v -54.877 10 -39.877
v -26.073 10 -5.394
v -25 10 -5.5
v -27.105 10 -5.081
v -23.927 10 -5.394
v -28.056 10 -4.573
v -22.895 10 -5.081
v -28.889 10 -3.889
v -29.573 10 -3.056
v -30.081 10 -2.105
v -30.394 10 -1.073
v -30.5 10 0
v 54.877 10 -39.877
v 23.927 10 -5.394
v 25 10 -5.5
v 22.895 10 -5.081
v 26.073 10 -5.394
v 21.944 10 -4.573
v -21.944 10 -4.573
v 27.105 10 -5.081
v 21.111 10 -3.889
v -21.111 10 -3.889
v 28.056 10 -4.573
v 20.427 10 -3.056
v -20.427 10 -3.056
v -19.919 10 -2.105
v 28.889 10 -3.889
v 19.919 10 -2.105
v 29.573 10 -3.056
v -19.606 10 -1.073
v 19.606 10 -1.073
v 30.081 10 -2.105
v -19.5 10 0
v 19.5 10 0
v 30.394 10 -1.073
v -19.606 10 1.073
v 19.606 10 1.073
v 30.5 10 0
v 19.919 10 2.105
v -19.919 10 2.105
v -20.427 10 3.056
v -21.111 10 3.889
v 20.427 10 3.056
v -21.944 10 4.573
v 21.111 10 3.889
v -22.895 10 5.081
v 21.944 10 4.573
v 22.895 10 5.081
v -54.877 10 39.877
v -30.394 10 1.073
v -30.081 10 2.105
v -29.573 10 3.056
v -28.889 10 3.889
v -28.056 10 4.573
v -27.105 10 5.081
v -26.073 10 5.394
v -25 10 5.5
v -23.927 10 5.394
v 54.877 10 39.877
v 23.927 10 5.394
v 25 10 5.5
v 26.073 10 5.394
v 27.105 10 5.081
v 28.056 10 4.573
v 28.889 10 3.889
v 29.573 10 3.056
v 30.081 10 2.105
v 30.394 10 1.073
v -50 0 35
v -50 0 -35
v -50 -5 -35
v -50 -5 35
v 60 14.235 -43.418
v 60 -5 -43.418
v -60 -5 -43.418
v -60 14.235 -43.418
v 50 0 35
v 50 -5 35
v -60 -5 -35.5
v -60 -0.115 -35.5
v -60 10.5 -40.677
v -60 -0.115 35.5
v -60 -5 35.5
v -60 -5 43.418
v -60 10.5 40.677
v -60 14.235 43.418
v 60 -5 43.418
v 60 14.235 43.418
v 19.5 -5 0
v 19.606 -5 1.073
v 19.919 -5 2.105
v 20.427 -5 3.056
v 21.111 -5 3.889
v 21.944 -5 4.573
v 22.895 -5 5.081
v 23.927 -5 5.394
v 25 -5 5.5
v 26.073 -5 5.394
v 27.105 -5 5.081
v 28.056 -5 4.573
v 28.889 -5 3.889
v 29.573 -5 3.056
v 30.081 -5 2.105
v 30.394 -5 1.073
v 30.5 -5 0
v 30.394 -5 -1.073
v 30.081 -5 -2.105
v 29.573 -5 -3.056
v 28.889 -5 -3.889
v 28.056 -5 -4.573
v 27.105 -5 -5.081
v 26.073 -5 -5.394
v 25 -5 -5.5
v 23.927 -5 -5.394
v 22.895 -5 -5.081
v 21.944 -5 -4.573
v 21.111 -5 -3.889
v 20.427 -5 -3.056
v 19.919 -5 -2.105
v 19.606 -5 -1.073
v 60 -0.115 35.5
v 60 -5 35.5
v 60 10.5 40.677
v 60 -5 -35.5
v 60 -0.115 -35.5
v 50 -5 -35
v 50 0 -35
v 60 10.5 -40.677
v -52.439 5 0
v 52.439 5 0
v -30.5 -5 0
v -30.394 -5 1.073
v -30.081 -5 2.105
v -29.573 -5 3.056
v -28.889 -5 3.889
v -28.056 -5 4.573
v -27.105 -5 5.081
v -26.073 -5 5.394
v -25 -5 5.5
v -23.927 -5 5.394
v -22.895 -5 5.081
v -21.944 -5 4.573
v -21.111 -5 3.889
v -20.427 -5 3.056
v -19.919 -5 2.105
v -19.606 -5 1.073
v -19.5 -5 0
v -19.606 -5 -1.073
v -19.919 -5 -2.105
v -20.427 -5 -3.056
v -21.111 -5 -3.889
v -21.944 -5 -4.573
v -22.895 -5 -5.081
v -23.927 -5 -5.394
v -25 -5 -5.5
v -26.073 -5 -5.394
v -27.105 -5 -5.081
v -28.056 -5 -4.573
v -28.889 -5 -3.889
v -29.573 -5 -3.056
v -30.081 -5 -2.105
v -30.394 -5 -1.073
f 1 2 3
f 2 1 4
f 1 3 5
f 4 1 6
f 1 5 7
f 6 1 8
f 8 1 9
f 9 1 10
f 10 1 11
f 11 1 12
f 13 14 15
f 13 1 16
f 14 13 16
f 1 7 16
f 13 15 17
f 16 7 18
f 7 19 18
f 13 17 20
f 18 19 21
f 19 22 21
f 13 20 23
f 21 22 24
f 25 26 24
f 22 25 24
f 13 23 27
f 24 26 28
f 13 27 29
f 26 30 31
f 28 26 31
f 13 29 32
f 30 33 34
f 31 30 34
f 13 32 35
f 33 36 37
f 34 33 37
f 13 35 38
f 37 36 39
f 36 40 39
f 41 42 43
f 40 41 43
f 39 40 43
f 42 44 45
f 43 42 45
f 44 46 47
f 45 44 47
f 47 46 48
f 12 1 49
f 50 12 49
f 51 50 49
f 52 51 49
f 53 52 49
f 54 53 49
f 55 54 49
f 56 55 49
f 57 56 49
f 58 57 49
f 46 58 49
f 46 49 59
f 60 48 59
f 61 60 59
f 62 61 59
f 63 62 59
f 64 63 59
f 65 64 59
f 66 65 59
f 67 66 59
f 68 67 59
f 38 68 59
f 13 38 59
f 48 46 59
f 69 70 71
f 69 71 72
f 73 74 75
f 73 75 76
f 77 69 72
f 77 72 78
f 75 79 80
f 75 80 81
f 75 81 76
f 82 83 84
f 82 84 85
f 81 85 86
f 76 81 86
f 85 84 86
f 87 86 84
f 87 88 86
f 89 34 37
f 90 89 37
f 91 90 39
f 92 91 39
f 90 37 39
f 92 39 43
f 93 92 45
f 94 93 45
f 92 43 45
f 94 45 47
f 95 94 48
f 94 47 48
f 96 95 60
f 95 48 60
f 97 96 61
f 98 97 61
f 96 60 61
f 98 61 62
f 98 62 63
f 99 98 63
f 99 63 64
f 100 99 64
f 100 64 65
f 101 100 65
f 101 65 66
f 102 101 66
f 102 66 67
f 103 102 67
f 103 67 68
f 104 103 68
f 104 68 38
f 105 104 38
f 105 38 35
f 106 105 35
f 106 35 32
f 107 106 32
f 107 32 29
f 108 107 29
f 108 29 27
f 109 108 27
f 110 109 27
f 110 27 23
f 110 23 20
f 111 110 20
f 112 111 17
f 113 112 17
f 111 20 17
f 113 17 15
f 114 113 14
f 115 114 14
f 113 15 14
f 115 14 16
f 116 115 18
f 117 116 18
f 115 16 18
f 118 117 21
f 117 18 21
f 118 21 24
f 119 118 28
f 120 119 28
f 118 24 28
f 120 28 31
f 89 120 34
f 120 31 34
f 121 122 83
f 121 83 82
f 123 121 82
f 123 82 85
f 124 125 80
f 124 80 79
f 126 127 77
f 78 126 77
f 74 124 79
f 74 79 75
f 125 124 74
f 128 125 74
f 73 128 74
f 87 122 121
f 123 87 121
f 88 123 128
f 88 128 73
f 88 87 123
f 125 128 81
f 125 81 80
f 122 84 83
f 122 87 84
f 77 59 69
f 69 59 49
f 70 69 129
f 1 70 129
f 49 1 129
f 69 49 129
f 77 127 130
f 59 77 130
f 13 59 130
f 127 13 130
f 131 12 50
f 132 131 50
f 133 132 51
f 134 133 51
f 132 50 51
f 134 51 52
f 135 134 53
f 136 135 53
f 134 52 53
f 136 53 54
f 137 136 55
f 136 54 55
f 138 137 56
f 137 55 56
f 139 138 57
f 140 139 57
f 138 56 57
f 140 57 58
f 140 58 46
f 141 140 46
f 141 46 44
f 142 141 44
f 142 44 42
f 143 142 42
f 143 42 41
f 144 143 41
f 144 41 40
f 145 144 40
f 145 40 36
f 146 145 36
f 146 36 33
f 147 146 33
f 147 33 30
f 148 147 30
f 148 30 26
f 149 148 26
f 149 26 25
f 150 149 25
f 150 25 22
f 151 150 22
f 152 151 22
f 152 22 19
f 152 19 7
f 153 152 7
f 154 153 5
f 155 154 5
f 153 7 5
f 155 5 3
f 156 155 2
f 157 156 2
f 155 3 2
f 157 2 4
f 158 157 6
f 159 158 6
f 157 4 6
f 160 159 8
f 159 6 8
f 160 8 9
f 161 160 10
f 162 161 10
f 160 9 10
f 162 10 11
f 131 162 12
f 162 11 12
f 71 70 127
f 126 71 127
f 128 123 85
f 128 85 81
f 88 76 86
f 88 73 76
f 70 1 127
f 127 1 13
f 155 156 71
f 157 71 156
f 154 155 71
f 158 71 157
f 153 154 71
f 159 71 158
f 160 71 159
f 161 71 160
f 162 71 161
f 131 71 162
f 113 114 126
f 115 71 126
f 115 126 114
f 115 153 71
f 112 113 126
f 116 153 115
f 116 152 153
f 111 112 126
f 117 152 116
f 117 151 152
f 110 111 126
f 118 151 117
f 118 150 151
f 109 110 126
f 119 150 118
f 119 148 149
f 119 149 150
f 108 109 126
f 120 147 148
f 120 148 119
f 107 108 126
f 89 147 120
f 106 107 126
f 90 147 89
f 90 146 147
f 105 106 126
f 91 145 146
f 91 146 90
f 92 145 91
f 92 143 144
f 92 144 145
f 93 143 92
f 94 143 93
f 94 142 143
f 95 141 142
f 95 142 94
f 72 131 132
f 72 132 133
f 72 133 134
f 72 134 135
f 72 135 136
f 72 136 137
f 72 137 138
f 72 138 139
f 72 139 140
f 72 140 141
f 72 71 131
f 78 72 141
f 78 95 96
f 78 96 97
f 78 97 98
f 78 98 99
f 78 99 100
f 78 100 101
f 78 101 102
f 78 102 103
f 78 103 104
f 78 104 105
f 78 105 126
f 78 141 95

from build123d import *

# Parameters (mm, degrees)
F0_W          = 100
F0_H          = 70
F1_DEPTH      = 10
F1_TAPER      = -26
F2_DEPTH      = 5
F4_D          = 11
F6_DEPTH      = 60
F6_DEPTH_BACK = 60


with BuildPart() as f1:
    # F0 (on Front) → F1 (new body)
    with BuildSketch(Plane.XZ):
        Rectangle(F0_W, F0_H)
    extrude(amount=-F1_DEPTH, taper=F1_TAPER)

    # F2 (add): a face of the model
    f2_faces = [f1.faces().sort_by_distance(p)[0] for p in [
        (0, 0, 0),
    ]]
    extrude(f2_faces, amount=F2_DEPTH)

    # F4 (through all)
    with Locations(Plane.XZ.offset(5)):
        with Locations((-25, 0), (25, 0)):
            Hole(F4_D / 2)


with BuildPart() as f6:
    # F5 (on Right) → F6 (new body, two sides)
    with BuildSketch(Plane.YZ) as f6_sk:
        Polygon((-5, 43.4184594378), (-5, 35.5), (-0.1154340956, 35.5), (10.5, 40.6774931502), (10.5, -40.6774931502), (-0.1154340956, -35.5), (-5, -35.5), (-5, -43.4184594378), (14.2345009372, -43.4184594378), (14.2345009372, 43.4184594378), align=None)
    extrude(amount=F6_DEPTH)
    extrude(f6_sk.sketch, amount=-F6_DEPTH_BACK)


solid = Compound([f1.part, f6.part])
